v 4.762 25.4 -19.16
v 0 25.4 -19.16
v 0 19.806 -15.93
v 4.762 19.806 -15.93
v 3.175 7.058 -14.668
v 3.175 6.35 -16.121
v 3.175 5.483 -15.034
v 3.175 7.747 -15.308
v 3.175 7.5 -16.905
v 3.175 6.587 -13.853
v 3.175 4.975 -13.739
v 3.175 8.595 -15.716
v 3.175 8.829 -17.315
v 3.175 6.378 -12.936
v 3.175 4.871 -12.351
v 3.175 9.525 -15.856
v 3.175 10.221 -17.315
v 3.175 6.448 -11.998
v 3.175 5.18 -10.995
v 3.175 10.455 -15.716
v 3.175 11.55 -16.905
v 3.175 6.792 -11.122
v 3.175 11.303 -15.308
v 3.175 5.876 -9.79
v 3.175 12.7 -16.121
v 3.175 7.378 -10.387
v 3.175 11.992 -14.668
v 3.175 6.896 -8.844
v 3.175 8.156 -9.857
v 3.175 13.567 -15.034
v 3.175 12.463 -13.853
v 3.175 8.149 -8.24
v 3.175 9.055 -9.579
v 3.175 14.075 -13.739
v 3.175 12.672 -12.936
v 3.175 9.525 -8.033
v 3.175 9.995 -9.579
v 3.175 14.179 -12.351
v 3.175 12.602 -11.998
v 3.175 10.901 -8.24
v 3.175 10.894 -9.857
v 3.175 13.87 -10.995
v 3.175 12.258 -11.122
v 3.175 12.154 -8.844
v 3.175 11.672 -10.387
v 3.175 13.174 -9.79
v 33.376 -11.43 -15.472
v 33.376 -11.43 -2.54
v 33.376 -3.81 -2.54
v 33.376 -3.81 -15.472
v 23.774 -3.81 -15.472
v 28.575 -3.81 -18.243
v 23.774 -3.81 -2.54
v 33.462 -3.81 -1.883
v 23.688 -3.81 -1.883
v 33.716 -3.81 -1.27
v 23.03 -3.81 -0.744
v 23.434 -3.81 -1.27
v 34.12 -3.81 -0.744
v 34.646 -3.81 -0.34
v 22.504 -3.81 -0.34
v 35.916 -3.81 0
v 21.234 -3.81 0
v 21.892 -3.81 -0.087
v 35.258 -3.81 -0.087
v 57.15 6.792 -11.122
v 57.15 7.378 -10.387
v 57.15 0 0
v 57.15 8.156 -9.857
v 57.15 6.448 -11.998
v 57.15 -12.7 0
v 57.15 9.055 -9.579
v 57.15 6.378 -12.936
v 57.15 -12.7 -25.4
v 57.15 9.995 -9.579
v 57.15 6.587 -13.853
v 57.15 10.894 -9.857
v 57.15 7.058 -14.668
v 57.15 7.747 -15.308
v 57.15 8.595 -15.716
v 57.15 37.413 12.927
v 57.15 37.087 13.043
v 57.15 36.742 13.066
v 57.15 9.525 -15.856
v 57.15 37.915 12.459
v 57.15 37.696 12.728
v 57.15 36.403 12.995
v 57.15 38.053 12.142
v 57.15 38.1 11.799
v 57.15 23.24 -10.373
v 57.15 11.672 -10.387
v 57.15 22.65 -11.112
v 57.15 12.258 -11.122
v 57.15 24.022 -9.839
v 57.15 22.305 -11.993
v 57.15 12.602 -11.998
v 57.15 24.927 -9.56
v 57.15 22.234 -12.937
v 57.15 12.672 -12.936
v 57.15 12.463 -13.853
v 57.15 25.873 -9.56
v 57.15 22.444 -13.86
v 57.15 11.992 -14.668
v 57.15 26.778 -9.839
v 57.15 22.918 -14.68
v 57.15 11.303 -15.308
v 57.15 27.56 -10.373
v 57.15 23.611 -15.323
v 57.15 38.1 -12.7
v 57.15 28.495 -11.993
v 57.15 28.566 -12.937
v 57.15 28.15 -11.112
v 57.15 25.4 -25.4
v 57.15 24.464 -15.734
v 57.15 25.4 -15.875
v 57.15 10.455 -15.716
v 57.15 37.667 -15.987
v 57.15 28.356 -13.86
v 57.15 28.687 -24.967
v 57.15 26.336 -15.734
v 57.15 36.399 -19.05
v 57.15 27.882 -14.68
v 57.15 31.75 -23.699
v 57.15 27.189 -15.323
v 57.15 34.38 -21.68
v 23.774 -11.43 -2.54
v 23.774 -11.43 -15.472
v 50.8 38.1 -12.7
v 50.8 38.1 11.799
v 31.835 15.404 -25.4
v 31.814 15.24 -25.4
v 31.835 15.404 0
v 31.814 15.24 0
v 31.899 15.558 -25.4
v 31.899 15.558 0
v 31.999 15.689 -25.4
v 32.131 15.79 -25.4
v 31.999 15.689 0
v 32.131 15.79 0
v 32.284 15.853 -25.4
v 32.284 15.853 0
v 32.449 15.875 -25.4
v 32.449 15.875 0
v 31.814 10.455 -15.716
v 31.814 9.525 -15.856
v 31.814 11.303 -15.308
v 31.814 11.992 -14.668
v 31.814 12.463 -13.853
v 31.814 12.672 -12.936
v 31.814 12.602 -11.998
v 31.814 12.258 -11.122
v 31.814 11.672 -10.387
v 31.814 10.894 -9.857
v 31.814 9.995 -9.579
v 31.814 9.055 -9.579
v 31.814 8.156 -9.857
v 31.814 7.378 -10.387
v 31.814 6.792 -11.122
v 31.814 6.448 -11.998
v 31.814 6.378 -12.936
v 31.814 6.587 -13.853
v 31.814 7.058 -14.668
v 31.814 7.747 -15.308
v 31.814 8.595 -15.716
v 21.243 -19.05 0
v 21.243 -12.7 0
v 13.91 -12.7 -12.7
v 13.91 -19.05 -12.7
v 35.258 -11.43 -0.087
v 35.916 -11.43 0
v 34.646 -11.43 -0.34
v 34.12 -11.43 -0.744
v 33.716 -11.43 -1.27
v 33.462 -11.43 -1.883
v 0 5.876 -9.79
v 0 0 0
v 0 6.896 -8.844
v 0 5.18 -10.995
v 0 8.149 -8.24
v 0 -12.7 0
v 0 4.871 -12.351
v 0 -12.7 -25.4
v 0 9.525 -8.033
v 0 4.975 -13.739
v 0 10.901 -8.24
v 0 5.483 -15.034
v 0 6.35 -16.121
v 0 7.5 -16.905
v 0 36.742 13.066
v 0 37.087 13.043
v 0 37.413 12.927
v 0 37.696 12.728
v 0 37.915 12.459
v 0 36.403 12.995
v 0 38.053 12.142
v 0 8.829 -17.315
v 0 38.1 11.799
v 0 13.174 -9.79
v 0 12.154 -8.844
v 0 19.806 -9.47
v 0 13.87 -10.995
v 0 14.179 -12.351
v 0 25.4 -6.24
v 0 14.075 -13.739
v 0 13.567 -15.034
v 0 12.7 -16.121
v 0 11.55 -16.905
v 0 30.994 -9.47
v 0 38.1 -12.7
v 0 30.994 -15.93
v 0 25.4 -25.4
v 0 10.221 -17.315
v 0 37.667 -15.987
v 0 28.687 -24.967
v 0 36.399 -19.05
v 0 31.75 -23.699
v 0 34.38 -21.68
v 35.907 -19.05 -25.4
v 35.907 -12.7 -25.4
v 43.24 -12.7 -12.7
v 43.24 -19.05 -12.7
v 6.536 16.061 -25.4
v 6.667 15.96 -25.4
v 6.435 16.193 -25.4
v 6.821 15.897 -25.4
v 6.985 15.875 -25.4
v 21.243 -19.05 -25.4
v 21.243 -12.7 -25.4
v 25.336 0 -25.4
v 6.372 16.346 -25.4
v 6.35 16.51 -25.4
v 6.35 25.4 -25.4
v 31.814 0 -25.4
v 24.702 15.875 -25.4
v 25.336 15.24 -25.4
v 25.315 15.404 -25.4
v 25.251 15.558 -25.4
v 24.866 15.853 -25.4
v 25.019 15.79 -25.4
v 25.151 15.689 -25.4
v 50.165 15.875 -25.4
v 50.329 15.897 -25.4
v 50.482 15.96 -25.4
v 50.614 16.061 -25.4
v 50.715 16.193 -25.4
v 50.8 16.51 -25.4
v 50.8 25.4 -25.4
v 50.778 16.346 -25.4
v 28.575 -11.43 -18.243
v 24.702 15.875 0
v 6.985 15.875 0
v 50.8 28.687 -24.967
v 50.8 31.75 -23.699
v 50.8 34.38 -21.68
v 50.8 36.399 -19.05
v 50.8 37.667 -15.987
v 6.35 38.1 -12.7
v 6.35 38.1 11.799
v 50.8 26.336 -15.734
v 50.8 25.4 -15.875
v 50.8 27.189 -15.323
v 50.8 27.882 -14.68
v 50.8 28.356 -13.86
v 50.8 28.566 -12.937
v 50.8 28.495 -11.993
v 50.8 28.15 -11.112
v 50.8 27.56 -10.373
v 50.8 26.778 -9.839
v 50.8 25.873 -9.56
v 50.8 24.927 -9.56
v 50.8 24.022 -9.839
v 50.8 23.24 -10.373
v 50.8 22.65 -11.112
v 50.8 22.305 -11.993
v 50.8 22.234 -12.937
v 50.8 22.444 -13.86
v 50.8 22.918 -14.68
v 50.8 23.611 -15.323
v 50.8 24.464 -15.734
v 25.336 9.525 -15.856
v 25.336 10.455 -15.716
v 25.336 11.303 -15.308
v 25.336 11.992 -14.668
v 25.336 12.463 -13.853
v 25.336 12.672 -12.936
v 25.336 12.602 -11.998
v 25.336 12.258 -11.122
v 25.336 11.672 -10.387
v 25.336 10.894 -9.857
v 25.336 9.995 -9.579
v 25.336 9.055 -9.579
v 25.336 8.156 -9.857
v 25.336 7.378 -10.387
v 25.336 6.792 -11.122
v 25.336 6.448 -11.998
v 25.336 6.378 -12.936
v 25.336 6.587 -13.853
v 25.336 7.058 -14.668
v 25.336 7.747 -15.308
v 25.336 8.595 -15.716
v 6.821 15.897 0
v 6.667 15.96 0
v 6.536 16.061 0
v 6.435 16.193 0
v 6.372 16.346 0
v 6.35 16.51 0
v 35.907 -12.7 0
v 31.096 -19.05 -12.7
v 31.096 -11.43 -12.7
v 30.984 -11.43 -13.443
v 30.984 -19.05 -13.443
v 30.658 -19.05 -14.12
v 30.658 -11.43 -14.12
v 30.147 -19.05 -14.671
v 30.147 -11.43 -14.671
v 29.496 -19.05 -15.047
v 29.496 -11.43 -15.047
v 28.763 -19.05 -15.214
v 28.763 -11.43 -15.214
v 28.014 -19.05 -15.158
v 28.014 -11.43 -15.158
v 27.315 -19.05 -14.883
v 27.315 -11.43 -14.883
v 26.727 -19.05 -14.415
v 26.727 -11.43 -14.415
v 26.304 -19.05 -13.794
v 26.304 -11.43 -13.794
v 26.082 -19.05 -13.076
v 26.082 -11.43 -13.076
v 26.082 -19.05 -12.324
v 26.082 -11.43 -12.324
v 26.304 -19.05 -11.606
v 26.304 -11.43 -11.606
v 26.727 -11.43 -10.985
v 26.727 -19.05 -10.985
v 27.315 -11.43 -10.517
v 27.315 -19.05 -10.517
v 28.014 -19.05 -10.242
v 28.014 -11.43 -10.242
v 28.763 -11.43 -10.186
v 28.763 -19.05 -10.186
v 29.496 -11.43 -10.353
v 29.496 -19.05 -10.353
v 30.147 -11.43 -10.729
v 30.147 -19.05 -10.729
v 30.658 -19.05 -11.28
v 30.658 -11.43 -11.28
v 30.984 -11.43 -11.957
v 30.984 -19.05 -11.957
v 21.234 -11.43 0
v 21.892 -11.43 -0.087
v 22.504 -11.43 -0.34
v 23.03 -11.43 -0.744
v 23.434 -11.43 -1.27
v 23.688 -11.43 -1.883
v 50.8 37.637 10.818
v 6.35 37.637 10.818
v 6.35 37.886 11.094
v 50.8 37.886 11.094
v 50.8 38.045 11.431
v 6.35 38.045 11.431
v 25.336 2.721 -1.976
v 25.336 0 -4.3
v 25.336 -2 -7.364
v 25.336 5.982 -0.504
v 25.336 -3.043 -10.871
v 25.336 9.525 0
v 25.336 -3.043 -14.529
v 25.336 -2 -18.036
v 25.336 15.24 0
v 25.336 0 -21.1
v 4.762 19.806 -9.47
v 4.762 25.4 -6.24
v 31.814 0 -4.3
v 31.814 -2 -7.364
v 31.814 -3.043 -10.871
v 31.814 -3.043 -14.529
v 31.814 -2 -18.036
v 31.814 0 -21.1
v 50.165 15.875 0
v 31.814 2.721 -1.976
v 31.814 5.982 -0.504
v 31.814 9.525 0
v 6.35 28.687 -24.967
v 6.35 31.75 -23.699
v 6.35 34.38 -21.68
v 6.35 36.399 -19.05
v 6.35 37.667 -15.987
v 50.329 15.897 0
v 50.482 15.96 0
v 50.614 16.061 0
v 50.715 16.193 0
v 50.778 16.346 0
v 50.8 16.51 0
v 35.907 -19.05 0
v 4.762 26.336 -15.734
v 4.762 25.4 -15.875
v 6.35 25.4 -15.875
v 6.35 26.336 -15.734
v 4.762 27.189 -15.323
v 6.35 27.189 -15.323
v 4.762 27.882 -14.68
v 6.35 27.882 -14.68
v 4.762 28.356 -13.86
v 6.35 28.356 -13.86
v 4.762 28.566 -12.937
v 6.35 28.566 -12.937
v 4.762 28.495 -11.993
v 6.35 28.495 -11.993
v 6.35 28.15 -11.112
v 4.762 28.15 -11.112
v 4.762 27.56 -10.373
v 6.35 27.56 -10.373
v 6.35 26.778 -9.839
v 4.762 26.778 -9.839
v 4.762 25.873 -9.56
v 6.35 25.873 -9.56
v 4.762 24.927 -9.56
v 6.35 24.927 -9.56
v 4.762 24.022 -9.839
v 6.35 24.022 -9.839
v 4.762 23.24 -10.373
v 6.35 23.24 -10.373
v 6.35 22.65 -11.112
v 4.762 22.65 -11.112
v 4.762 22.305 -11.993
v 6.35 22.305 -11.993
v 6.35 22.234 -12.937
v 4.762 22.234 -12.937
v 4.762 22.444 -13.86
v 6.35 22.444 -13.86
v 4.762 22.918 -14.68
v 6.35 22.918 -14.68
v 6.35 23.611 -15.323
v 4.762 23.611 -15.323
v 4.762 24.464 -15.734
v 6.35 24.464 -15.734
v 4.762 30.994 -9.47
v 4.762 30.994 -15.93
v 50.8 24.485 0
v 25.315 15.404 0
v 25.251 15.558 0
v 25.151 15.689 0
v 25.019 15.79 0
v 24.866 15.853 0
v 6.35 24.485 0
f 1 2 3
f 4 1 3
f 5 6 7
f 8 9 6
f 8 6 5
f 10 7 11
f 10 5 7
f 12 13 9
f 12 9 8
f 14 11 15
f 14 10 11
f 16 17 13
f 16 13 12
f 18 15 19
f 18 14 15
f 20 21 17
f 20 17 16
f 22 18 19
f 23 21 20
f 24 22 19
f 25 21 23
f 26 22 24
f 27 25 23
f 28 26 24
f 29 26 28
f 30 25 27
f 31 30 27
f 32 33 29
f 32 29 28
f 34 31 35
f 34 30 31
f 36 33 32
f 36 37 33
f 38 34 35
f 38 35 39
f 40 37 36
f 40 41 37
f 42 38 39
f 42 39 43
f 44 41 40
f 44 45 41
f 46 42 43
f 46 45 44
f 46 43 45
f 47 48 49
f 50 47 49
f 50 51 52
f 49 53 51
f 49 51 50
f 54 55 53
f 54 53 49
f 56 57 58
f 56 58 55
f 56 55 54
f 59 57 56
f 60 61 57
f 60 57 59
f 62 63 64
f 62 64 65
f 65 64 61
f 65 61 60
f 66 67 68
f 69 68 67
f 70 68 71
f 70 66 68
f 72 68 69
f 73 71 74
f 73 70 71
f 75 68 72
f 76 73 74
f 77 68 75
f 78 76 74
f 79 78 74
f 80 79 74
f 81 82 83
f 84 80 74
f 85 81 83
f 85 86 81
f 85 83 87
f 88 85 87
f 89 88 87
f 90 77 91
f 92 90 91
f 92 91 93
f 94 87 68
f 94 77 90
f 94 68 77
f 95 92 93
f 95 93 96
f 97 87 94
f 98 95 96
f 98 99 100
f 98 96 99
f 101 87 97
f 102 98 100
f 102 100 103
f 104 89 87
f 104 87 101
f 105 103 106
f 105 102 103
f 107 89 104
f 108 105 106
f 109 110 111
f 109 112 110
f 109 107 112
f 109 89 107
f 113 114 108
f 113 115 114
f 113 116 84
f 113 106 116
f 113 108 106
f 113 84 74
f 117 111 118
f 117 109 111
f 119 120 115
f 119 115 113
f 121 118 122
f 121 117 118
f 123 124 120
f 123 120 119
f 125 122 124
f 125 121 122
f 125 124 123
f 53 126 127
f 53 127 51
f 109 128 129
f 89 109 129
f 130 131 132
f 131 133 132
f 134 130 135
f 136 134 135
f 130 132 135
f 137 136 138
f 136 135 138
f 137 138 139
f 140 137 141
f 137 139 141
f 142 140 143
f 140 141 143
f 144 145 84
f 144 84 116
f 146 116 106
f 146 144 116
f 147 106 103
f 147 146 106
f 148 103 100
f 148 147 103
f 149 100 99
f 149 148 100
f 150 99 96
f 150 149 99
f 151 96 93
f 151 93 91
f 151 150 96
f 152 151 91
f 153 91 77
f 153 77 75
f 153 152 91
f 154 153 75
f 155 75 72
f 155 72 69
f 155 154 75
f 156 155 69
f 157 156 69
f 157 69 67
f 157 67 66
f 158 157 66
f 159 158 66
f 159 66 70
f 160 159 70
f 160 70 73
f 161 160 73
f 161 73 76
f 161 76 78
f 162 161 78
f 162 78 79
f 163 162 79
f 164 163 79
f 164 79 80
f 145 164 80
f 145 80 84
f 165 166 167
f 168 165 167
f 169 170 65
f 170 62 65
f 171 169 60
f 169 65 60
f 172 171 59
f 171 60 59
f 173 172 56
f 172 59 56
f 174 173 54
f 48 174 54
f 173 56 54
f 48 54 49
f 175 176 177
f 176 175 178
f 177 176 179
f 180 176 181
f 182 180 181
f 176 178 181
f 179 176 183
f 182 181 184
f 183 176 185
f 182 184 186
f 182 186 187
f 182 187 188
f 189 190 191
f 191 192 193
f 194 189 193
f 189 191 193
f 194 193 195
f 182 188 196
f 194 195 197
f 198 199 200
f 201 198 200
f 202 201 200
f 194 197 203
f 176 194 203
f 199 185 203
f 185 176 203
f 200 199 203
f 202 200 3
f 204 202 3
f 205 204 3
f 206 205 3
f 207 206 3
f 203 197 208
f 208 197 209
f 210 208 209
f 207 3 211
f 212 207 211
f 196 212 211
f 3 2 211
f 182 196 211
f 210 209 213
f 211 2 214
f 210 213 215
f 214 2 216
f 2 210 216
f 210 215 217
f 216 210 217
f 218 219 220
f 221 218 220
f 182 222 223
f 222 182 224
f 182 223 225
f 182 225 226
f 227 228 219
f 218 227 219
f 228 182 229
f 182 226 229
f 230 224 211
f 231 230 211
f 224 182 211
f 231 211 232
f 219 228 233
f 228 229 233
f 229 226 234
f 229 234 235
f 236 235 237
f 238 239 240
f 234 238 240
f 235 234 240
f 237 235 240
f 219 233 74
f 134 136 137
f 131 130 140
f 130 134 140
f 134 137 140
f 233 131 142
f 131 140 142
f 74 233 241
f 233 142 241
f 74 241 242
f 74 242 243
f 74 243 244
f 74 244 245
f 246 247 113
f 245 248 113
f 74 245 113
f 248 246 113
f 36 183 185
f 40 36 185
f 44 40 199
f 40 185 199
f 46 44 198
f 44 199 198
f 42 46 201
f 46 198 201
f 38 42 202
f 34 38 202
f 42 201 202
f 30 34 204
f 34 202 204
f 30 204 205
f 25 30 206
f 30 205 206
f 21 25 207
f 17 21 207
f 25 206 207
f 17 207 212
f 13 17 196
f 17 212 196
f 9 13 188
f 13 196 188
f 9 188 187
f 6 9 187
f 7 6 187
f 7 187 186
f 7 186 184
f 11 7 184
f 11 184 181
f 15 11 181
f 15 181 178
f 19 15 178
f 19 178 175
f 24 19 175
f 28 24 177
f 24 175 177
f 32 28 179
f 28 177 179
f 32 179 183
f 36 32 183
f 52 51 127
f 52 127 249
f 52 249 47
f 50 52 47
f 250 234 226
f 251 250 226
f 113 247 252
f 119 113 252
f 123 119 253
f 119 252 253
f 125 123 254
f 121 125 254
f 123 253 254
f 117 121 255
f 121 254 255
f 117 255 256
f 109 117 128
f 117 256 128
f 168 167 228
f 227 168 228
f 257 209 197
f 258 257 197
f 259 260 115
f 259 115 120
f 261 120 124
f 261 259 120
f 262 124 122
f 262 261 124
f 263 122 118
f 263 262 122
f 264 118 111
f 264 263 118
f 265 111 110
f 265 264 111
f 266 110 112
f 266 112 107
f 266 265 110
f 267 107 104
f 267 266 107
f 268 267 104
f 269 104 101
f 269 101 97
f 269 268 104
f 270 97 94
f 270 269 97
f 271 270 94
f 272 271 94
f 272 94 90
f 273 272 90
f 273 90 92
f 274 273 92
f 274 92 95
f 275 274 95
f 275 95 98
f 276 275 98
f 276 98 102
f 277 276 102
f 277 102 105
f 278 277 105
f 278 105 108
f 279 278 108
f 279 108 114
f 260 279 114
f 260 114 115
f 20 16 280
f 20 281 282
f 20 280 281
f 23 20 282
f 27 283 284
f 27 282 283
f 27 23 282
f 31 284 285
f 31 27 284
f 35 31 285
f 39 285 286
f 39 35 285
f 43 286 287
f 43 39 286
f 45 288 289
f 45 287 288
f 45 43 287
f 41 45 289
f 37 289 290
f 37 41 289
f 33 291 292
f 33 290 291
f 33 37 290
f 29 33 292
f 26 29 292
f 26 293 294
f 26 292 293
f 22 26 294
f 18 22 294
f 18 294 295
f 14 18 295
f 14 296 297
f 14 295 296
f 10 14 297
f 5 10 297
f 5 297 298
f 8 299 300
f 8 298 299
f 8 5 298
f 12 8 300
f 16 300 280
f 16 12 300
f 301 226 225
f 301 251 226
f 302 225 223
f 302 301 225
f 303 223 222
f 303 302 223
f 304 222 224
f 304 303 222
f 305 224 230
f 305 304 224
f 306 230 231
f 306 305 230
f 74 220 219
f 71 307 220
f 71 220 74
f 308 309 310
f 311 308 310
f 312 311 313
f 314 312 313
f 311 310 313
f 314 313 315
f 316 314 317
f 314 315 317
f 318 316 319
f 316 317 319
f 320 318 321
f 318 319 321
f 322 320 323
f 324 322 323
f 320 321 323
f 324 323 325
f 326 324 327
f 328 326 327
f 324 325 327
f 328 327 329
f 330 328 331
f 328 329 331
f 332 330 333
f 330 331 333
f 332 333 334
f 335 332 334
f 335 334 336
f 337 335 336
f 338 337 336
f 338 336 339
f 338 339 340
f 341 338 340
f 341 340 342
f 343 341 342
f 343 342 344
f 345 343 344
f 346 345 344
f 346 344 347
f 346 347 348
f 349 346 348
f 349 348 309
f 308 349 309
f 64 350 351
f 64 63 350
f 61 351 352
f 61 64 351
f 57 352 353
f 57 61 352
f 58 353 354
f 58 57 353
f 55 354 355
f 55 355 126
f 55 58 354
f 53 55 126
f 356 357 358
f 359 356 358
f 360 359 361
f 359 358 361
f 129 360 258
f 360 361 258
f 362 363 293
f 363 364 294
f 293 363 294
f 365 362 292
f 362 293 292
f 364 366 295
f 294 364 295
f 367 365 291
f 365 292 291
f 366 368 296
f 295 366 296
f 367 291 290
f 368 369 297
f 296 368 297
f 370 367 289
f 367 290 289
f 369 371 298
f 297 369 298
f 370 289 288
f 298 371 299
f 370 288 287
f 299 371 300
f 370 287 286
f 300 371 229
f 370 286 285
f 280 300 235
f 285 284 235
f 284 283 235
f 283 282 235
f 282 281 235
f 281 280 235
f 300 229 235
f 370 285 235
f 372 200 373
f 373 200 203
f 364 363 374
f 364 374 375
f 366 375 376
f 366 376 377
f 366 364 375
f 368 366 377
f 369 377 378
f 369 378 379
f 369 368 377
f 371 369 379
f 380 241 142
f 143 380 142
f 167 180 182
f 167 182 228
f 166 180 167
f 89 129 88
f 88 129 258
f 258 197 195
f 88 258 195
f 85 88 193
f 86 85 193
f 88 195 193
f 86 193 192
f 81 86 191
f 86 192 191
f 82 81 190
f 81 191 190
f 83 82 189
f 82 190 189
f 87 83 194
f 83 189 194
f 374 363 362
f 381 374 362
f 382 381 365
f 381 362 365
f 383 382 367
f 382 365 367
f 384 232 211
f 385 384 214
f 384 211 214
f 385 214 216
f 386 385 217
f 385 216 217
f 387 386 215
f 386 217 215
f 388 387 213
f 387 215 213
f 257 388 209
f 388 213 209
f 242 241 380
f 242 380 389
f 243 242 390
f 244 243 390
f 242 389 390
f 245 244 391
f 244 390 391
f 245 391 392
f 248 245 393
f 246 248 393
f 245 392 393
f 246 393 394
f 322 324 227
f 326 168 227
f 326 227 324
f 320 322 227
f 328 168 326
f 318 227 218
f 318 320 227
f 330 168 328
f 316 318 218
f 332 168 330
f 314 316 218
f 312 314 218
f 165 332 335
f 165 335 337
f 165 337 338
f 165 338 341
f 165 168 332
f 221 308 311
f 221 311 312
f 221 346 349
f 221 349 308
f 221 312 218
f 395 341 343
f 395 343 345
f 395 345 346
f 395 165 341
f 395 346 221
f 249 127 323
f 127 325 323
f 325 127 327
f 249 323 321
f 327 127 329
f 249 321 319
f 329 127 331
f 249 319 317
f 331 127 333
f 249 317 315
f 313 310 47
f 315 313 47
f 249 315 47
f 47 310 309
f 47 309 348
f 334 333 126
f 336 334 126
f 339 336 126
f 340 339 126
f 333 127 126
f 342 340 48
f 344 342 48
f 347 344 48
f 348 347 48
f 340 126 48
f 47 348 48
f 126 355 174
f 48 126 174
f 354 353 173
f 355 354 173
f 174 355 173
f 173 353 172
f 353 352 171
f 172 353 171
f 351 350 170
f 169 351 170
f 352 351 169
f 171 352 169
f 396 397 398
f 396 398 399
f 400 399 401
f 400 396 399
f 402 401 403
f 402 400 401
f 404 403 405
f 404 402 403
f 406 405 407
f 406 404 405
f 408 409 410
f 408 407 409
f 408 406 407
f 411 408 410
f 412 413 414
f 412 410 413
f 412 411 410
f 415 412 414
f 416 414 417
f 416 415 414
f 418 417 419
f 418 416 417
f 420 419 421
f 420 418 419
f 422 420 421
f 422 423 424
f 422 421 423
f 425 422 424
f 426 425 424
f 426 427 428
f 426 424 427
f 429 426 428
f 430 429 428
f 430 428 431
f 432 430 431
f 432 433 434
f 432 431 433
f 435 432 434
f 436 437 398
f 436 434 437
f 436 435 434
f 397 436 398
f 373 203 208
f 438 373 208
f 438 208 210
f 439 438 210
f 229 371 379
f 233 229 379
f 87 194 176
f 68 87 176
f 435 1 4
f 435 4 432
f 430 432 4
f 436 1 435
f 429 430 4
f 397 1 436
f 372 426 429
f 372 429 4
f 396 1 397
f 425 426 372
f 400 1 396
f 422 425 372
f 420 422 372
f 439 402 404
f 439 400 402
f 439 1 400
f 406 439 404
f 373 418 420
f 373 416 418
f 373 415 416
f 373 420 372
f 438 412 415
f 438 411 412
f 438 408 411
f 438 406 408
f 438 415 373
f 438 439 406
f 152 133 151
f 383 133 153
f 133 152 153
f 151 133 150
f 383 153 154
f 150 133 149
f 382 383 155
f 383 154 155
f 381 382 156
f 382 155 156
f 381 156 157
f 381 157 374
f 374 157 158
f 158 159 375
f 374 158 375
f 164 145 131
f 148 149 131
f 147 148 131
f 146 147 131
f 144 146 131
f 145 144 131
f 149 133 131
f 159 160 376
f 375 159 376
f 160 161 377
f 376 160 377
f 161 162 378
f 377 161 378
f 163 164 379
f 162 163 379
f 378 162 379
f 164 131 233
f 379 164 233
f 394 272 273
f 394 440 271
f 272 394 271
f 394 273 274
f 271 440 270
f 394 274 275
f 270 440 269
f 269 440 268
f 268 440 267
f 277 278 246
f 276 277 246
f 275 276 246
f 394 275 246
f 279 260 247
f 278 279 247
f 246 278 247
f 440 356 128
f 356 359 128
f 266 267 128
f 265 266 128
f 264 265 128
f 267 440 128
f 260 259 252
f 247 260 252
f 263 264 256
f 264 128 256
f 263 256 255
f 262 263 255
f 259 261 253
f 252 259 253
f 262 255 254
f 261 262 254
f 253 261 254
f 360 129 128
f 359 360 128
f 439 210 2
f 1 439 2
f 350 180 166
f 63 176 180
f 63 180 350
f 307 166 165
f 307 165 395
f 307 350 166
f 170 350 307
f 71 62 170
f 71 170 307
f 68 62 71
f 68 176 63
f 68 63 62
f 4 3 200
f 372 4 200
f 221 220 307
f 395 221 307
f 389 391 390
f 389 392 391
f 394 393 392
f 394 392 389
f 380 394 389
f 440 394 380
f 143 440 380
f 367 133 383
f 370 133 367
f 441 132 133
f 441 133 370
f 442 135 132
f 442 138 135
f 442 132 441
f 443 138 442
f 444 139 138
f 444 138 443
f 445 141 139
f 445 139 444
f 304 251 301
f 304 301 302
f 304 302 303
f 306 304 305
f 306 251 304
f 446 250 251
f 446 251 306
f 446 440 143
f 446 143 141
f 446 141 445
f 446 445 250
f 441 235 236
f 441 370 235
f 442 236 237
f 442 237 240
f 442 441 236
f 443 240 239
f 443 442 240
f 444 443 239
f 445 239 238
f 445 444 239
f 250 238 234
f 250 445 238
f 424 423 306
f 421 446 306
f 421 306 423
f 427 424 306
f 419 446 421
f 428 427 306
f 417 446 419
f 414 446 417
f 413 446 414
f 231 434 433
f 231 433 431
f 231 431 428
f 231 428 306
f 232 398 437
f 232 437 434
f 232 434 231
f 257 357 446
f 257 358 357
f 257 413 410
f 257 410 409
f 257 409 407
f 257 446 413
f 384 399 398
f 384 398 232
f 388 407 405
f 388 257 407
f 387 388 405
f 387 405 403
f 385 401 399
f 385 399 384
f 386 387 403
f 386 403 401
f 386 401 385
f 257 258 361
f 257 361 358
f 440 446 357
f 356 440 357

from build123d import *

# Parameters (mm, degrees)
SKETCH2_R                        = 3.15595
SKETCH2_R_2                      = 12.7
SKETCH2_R_3                      = 3.175
BOSS_EXTRUDE1_DEPTH              = 57.15
SKETCH3_W                        = 44.45
SKETCH3_H                        = 12.7
HOLLOWING_DEPTH                  = 25.4
FILLET2_R                        = 0.635
GEAR_CREVASE_DEPTH               = 6.477
SKETCH4_W                        = 57.15
SKETCH4_H                        = 25.4
BASE_EXTENSION_DEPTH             = 12.7
CAPTIVE_NUT_BORE_DEPTH           = 4.7625
HEX_CONNECTION_DEPTH             = 6.35
GEAR_CLEARANCE_DEPTH             = 6.477
BOSS_EXTRUDE6_DEPTH              = 6.35
BOSS_EXTRUDE7_START              = 50.8
BOSS_EXTRUDE7_DEPTH              = 6.35
SKETCH9_W                        = 9.6012
SKETCH9_H                        = 7.62
CUT_EXTRUDE5_DEPTH               = 11.43
CUT_EXTRUDE6_START               = -7.62
CUT_EXTRUDE6_DEPTH               = 7.62
F_10_0_1935_DIAMETER_HOLE1_D     = 5.0419
F_10_0_1935_DIAMETER_HOLE1_DEPTH = 7.62
FILLET3_R                        = 2.54
SKETCH14_R                       = 4.66725
CUT_EXTRUDE7_DEPTH               = 3.175


with BuildPart() as part:
    # Sketch2 → Boss-Extrude1 (new body)
    # profile 1 of 3: a face of its own
    with BuildSketch(Plane(origin=(0, 0, 0), x_dir=(0, 0, -1), z_dir=(1, 0, 0))):
        with BuildLine():
            Line((-12.994989453, 36.403030323), (0, 0))
            Line((0, 0), (0, 24.485346))
            Line((0, 24.485346), (-10.818105201, 37.636792682))
            ThreePointArc((-10.818105201, 37.636792682), (-11.256570169, 37.978374222), (-11.798913831, 38.1))
            ThreePointArc((-11.798913831, 38.1), (-12.83697729, 37.561658565), (-12.994989453, 36.403030323))
        make_face()
    # profile 2 of 3: a face of its own
    with BuildSketch(Plane(origin=(0, 0, 0), x_dir=(0, 0, -1), z_dir=(1, 0, 0))):
        with BuildLine():
            Line((0, 24.485346), (0, 0))
            Line((0, 0), (25.4, 0))
            Line((25.4, 0), (25.4, 25.4))
            ThreePointArc((25.4, 25.4), (12.7, 12.7), (0, 25.4))
            Line((0, 25.4), (0, 24.485346))
        make_face()
        with Locations((12.7, 9.525)):
            Circle(SKETCH2_R, mode=Mode.SUBTRACT)
    # profile 3 of 3: a face of its own
    with BuildSketch(Plane(origin=(0, 0, 0), x_dir=(0, 0, -1), z_dir=(1, 0, 0))):
        with Locations((12.7, 25.4)):
            Circle(SKETCH2_R_2)
        with Locations((12.7, 25.4)):
            Circle(SKETCH2_R_3, mode=Mode.SUBTRACT)
    extrude(amount=BOSS_EXTRUDE1_DEPTH)

    # Sketch3 → Hollowing (cut)
    with BuildSketch(Plane(origin=(0, 0, -25.4), x_dir=(-1, 0, 0), z_dir=(0, 0, -1))):
        Polygon((-50.8, 25.4), (-50.8, 15.875), (-31.8135, 15.875), (-31.8135, 0), (-25.3365, 0), (-25.3365, 15.875), (-6.35, 15.875), (-6.35, 25.4), align=None)
        with Locations((-28.575, 31.75)):
            Rectangle(SKETCH3_W, SKETCH3_H)
    extrude(amount=-HOLLOWING_DEPTH, mode=Mode.SUBTRACT)

    # Fillet2
    fillet2_edges = [part.edges().sort_by_distance(p)[0] for p in [
        (50.8, 15.875, -12.7),
        (25.3365, 15.875, -12.7),
        (31.8135, 15.875, -12.7),
        (6.35, 15.875, -12.7),
    ]]
    fillet(fillet2_edges, radius=FILLET2_R)

    # Sketch8 → Gear Crevase (add)
    with BuildSketch(Plane(origin=(25.3365, 0, 0), x_dir=(0, 0, -1), z_dir=(1, 0, 0))):
        with BuildLine():
            ThreePointArc((4.299739587, 0), (1.124739582, 4.299739599), (0, 9.525000025))
            Line((0, 9.525000025), (0, 0))
            Line((0, 0), (4.299739587, 0))
        make_face()
    extrude(amount=GEAR_CREVASE_DEPTH)

    # Sketch4 → Base Extension (add)
    with BuildSketch(Plane.XZ):
        with Locations((28.575, -12.7)):
            Rectangle(SKETCH4_W, SKETCH4_H)
    extrude(amount=BASE_EXTENSION_DEPTH)

    # Sketch7 → Captive Nut Bore (cut)
    with BuildSketch(Plane.ZY):
        Polygon((-9.470100522, 19.80565), (-6.240201043, 25.4), (-9.470100522, 30.99435), (-15.929899478, 30.99435), (-19.159798957, 25.4), (-15.929899478, 19.80565), align=None)
    extrude(amount=-CAPTIVE_NUT_BORE_DEPTH, mode=Mode.SUBTRACT)

    # Sketch5 → Hex Connection (add)
    with BuildSketch(Plane.XZ.offset(12.7)):
        Polygon((35.907348419, 0), (21.242651581, 0), (13.910303163, -12.7), (21.242651581, -25.4), (35.907348419, -25.4), (43.239696837, -12.7), align=None)
    extrude(amount=HEX_CONNECTION_DEPTH)

    # Sketch8<3> → Gear Clearance (cut)
    with BuildSketch(Plane(origin=(25.3365, 0, 0), x_dir=(0, 0, -1), z_dir=(1, 0, 0))):
        with BuildLine():
            Line((21.100260413, 0), (4.299739587, 0))
            ThreePointArc((4.299739587, 0), (12.7, -3.175), (21.100260413, 0))
        make_face()
    extrude(amount=GEAR_CLEARANCE_DEPTH, mode=Mode.SUBTRACT)

    # Sketch2<3> → Boss-Extrude6 (add)
    with BuildSketch(Plane(origin=(0, 0, 0), x_dir=(0, 0, -1), z_dir=(1, 0, 0))):
        with BuildLine():
            Line((-10.818105201, 37.636792682), (0, 24.485346))
            Line((0, 24.485346), (0, 25.4))
            ThreePointArc((0, 25.4), (3.719743879, 34.380256121), (12.7, 38.1))
            Line((12.7, 38.1), (-11.798913831, 38.1))
            ThreePointArc((-11.798913831, 38.1), (-11.256570169, 37.978374222), (-10.818105201, 37.636792682))
        make_face()
    extrude(amount=BOSS_EXTRUDE6_DEPTH)

    # Sketch2<4> → Boss-Extrude7 (add)
    with BuildSketch(Plane(origin=(0, 0, 0), x_dir=(0, 0, -1), z_dir=(1, 0, 0)).offset(BOSS_EXTRUDE7_START)):
        with BuildLine():
            Line((-10.818105201, 37.636792682), (0, 24.485346))
            Line((0, 24.485346), (0, 25.4))
            ThreePointArc((0, 25.4), (3.719743879, 34.380256121), (12.7, 38.1))
            Line((12.7, 38.1), (-11.798913831, 38.1))
            ThreePointArc((-11.798913831, 38.1), (-11.256570169, 37.978374222), (-10.818105201, 37.636792682))
        make_face()
    extrude(amount=BOSS_EXTRUDE7_DEPTH)

    # Sketch9 → Cut-Extrude5 (cut)
    with BuildSketch(Plane.XY):
        with Locations((28.575, -7.62)):
            Rectangle(SKETCH9_W, SKETCH9_H)
    extrude(amount=-CUT_EXTRUDE5_DEPTH, mode=Mode.SUBTRACT)

    # Sketch10 → Cut-Extrude6 (cut)
    with BuildSketch(Plane.XZ.offset(19.05).offset(CUT_EXTRUDE6_START)):
        Polygon((28.575, -7.156744595), (23.7744, -9.928372298), (23.7744, -15.471627702), (28.575, -18.243255405), (33.3756, -15.471627702), (33.3756, -9.928372298), align=None)
    extrude(amount=-CUT_EXTRUDE6_DEPTH, mode=Mode.SUBTRACT)

    # #10 (0.1935) Diameter Hole1
    with Locations(Plane(origin=(0, -19.05, 0), x_dir=(-1, 0, 0), z_dir=(0, -1, 0))):
        with Locations((-28.575, 12.7)):
            Hole(F_10_0_1935_DIAMETER_HOLE1_D / 2, depth=F_10_0_1935_DIAMETER_HOLE1_DEPTH)

    # Fillet3
    fillet3_edges = [part.edges().sort_by_distance(p)[0] for p in [
        (33.3756, -7.62, 0),
        (23.7744, -7.62, 0),
    ]]
    fillet(fillet3_edges, radius=FILLET3_R)

    # Sketch14 → Cut-Extrude7 (cut)
    with BuildSketch(Plane.ZY):
        with Locations((-12.7, 9.525)):
            Circle(SKETCH14_R)
    extrude(amount=-CUT_EXTRUDE7_DEPTH, mode=Mode.SUBTRACT)


solid = part.part
